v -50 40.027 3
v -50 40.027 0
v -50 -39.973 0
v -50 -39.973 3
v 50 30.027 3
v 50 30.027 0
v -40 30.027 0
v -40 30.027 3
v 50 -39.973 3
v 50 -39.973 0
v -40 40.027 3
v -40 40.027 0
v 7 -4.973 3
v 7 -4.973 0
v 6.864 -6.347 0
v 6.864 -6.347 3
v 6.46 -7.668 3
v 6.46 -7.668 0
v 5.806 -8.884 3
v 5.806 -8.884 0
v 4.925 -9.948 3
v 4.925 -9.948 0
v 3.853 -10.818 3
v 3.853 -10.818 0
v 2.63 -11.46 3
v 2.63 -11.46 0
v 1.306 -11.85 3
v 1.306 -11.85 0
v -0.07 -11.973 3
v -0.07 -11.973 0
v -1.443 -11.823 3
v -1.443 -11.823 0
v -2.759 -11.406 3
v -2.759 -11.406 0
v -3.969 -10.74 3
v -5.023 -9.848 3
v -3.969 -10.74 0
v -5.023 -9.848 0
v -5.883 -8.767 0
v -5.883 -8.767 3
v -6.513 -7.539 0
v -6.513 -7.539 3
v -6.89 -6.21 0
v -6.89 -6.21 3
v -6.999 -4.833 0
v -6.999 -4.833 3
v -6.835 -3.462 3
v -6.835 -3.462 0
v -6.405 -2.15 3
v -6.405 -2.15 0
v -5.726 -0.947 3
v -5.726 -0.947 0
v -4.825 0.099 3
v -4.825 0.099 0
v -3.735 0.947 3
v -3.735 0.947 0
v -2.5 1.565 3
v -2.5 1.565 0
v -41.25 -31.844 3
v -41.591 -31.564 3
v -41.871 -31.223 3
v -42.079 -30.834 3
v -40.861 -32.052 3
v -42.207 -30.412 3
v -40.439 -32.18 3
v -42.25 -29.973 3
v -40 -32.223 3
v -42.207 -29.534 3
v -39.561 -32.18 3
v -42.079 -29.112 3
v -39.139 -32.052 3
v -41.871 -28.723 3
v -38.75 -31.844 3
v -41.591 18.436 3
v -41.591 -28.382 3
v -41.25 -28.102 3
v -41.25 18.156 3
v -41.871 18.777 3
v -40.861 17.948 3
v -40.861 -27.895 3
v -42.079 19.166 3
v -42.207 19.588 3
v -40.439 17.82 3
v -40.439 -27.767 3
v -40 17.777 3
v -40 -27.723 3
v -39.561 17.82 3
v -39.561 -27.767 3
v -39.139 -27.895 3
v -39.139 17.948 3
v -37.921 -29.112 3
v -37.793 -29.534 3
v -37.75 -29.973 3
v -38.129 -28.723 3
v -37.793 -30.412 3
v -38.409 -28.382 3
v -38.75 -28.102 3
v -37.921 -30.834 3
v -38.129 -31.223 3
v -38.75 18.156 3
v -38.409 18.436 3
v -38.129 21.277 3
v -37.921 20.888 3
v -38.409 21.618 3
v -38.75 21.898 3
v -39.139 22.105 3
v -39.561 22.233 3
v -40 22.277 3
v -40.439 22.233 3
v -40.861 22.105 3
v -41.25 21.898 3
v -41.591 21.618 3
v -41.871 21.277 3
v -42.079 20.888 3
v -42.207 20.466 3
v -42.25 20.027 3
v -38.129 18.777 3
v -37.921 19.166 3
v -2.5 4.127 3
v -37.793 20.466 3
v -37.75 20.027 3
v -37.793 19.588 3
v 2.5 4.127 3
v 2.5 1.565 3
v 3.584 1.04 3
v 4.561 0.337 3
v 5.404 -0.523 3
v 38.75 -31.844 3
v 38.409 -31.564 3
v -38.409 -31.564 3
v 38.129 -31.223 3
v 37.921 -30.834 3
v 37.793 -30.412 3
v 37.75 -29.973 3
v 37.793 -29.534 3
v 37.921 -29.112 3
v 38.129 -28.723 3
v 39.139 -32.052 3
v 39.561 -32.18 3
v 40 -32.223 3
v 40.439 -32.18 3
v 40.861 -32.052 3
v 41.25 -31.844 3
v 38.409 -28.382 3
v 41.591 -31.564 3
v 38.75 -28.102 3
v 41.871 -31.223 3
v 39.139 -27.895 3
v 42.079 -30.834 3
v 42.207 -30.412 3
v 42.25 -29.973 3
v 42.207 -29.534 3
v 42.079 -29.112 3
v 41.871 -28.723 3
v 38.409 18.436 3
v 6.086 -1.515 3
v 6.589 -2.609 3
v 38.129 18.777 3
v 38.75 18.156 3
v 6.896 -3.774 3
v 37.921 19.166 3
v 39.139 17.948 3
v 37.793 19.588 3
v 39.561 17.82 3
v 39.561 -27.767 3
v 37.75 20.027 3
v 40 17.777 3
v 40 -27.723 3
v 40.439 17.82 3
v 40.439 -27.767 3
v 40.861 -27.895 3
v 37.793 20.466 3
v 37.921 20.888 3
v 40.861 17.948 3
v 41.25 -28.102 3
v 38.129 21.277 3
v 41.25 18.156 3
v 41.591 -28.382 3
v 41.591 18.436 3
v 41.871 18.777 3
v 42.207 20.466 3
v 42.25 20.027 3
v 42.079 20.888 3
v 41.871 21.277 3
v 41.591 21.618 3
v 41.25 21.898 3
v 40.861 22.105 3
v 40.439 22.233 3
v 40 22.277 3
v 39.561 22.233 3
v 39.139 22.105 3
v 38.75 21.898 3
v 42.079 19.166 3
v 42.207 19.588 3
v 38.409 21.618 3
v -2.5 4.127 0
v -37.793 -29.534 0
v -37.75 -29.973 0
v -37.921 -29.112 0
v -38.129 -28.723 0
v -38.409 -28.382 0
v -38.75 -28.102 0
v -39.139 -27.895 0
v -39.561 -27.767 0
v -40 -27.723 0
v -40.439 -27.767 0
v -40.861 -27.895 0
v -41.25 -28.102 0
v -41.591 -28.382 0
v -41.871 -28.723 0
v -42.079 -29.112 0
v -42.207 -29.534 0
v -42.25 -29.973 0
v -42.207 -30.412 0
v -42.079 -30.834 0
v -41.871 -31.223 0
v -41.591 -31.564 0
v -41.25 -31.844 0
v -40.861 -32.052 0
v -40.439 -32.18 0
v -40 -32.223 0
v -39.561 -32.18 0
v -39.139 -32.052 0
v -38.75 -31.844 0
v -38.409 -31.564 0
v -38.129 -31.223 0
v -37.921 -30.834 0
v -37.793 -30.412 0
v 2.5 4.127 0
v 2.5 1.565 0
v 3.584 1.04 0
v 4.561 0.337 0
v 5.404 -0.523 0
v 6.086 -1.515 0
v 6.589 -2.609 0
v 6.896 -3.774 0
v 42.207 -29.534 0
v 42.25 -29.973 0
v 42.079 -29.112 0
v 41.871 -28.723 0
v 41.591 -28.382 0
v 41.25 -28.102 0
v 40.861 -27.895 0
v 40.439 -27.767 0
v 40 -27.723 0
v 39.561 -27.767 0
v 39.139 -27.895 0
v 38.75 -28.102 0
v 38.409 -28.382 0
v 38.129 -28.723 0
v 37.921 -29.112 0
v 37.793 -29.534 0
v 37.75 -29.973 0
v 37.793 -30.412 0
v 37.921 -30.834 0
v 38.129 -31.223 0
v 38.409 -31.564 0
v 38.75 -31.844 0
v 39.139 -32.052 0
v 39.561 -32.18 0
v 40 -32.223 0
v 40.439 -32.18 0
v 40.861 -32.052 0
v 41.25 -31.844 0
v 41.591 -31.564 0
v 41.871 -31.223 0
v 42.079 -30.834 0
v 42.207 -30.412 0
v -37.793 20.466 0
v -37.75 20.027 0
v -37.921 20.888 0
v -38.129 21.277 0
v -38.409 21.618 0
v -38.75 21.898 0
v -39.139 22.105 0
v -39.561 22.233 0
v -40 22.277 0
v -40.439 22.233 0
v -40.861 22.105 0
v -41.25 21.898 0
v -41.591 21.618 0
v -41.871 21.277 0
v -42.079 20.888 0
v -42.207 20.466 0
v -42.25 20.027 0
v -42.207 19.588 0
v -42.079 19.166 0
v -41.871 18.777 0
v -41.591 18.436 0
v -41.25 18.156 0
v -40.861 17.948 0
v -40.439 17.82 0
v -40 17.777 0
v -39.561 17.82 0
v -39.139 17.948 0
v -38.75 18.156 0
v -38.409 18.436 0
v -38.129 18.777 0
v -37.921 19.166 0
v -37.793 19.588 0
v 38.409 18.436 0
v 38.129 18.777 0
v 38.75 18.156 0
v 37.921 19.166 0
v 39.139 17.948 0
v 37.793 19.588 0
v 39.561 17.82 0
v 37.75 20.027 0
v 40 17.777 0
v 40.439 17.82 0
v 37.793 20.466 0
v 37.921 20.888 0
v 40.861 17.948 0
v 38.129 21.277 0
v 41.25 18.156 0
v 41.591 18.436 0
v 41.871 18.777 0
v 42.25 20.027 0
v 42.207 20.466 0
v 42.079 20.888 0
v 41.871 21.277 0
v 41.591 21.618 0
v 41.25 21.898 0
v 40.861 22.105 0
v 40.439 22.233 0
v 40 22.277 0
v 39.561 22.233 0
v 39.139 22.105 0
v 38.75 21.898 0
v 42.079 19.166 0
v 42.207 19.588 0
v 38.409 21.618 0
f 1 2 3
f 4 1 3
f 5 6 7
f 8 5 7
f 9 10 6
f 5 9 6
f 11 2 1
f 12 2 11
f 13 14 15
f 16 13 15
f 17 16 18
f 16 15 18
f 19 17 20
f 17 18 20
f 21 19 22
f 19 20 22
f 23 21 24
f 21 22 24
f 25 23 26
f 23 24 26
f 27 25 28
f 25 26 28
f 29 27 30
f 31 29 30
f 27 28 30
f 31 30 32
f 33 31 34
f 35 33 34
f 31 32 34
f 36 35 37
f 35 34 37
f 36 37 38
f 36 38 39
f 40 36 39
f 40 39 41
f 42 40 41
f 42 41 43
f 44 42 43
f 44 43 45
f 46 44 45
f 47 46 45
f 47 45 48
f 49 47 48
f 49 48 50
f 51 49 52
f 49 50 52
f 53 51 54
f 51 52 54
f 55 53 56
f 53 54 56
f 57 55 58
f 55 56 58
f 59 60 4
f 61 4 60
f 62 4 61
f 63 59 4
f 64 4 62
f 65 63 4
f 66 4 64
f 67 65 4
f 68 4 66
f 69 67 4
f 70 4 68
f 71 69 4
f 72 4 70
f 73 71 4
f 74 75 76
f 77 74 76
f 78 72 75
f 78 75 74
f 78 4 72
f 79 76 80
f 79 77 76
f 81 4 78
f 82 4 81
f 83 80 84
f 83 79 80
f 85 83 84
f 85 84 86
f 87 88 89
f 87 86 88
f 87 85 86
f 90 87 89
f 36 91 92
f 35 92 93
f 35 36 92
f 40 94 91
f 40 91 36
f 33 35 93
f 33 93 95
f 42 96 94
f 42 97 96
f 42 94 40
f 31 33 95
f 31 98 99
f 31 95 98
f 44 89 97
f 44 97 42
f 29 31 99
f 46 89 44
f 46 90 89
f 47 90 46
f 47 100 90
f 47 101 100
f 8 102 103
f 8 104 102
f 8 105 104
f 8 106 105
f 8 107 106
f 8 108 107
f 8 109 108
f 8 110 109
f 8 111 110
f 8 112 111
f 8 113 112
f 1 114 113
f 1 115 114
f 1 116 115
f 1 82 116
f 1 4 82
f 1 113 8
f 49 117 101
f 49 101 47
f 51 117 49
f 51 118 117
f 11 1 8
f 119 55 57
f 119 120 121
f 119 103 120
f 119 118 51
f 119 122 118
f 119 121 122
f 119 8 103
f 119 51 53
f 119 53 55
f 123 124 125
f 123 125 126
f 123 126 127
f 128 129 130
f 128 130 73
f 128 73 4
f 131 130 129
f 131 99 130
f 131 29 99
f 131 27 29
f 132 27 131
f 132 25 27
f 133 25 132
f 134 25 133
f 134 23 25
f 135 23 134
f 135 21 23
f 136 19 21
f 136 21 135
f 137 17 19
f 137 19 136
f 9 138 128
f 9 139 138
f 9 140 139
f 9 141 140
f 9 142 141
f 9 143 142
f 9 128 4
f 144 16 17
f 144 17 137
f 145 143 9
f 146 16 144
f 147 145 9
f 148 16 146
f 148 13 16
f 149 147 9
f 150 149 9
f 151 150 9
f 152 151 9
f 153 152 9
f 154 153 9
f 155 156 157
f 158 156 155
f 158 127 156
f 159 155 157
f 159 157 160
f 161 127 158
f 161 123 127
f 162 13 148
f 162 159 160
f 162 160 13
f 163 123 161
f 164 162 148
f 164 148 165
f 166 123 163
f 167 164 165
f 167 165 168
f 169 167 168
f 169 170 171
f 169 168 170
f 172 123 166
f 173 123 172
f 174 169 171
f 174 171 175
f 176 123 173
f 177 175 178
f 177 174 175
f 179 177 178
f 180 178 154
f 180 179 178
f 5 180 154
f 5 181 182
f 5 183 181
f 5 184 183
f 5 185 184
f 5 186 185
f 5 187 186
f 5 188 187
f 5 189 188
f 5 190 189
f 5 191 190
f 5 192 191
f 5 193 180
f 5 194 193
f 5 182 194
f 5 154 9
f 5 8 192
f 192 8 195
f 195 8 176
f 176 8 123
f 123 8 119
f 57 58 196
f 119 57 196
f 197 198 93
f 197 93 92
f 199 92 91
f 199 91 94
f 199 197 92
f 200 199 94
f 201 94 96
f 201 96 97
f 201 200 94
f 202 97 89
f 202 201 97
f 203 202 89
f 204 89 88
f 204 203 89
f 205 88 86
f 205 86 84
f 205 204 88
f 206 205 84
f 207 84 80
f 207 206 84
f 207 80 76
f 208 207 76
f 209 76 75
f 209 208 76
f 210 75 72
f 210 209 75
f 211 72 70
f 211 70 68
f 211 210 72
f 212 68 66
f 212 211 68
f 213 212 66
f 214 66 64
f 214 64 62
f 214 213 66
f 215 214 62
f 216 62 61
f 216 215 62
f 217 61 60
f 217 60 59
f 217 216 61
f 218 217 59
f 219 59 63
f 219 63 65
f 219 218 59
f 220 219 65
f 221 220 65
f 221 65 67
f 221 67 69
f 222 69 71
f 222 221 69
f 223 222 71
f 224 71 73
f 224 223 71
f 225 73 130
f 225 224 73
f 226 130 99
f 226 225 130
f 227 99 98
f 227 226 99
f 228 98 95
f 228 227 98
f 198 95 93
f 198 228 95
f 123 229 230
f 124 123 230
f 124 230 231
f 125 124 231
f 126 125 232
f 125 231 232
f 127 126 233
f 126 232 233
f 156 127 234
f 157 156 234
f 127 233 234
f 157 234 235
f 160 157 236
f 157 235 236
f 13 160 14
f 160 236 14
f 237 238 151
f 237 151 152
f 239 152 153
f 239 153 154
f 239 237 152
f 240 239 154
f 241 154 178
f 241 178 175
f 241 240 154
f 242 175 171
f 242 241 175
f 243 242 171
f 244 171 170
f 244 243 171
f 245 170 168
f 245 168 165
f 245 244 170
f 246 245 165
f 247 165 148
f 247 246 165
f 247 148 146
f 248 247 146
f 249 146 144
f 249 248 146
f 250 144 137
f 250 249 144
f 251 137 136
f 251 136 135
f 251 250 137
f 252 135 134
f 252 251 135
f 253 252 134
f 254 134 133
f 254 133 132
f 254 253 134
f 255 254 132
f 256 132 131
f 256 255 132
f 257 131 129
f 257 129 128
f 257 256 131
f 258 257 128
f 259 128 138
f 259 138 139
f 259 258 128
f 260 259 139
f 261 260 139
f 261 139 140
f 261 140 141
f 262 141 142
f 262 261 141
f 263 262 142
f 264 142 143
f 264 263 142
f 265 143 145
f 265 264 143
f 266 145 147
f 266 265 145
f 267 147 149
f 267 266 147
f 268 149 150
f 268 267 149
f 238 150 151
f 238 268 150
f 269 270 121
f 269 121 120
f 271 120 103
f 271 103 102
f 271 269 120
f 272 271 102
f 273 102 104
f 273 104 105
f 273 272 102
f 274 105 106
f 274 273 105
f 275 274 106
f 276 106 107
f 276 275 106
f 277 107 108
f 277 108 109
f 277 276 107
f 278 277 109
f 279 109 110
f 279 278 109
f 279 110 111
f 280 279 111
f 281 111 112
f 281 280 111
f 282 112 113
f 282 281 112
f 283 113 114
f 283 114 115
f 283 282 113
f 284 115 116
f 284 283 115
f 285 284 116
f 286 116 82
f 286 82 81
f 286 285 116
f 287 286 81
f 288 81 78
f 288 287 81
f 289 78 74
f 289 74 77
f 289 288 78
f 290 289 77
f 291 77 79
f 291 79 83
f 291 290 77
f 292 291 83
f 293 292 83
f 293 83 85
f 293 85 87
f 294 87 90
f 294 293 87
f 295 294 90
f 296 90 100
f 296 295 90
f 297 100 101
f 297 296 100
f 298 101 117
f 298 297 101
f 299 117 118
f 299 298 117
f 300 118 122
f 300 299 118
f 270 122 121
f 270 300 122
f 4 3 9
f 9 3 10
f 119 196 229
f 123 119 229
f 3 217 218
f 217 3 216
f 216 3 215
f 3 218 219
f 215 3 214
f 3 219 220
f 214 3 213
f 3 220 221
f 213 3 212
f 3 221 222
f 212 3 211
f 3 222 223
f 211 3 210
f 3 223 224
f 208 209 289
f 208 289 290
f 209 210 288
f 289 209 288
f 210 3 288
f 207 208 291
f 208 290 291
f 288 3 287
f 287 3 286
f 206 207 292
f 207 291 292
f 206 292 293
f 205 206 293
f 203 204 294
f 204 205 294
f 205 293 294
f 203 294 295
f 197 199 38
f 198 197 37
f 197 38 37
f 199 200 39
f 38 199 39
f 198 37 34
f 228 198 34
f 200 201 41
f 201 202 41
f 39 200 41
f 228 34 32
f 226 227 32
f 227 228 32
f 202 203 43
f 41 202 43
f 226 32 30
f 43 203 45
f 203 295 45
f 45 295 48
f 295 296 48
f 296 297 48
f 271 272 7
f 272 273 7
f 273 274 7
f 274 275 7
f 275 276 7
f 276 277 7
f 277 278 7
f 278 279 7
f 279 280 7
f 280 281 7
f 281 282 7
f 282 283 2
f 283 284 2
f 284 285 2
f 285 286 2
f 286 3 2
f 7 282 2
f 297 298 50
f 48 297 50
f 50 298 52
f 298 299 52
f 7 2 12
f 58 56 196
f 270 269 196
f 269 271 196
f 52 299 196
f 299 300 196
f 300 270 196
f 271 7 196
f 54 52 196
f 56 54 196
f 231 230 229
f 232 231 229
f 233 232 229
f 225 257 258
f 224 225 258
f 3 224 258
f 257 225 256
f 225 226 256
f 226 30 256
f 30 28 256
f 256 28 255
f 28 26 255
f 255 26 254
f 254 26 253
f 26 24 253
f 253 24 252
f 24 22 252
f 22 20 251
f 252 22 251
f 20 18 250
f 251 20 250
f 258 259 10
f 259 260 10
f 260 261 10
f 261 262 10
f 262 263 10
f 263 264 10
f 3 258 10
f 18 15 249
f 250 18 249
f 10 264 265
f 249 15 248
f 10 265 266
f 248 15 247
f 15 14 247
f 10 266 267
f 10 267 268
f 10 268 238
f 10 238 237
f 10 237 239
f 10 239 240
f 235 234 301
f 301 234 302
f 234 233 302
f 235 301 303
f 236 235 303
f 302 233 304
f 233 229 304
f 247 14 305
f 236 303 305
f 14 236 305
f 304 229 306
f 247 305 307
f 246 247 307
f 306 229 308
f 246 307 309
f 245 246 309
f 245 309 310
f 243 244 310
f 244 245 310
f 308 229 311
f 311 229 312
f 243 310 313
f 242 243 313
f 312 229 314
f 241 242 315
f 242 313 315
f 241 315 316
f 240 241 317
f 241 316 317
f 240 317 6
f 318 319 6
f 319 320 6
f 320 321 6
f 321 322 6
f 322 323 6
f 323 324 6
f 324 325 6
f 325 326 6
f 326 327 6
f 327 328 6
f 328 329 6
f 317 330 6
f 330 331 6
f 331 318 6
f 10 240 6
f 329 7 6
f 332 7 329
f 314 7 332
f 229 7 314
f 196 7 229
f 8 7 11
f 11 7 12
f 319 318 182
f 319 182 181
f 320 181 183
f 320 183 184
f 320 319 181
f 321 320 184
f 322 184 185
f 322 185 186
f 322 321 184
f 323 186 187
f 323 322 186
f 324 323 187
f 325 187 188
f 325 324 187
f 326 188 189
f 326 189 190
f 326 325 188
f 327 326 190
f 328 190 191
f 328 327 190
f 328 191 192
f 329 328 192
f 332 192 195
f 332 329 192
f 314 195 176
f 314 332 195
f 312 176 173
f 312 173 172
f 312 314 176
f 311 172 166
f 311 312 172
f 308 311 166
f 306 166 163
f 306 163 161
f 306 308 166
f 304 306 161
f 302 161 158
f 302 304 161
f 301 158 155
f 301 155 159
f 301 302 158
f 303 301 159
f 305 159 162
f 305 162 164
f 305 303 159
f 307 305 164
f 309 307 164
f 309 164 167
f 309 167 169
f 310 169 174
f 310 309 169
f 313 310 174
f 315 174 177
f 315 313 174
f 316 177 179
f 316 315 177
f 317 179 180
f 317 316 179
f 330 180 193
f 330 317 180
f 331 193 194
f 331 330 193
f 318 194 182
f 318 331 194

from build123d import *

# Parameters (mm, degrees)
F0_R     = 2.25
F0_W     = 10
F0_H     = 10
F1_DEPTH = 3


# Not quite as in the source:
# - a feature names something its author has since deleted; it is built from what else it names


with BuildPart() as f1:
    # F0 (on Top) → F1 (new body)
    with BuildSketch(Plane.XY):
        Polygon((-50, -39.9732751399), (50, -39.9732751399), (50, 30.0267248601), (-40, 30.0267248601), (-50, 30.0267248601), align=None)
        with Locations((-40, -29.9732751399)):
            Circle(F0_R, mode=Mode.SUBTRACT)
        with Locations((40, -29.9732751399)):
            Circle(F0_R, mode=Mode.SUBTRACT)
        with BuildLine():
            Line((2.5, 4.1267248601), (2.5, 1.5650732754))
            ThreePointArc((2.5, 1.5650732754), (5.7662812973, -1.0046481733), (7, -4.9732751399))
            ThreePointArc((7, -4.9732751399), (-3.9686269666, -10.7395564373), (-2.5, 1.5650732754))
            Line((-2.5, 1.5650732754), (-2.5, 4.1267248601))
            Line((-2.5, 4.1267248601), (2.5, 4.1267248601))
        make_face(mode=Mode.SUBTRACT)
        with Locations((-40, 20.0267248601)):
            Circle(F0_R, mode=Mode.SUBTRACT)
        with Locations((40, 20.0267248601)):
            Circle(F0_R, mode=Mode.SUBTRACT)
        with Locations((-45, 35.0267248601)):
            Rectangle(F0_W, F0_H)
    extrude(amount=F1_DEPTH)


solid = f1.part
